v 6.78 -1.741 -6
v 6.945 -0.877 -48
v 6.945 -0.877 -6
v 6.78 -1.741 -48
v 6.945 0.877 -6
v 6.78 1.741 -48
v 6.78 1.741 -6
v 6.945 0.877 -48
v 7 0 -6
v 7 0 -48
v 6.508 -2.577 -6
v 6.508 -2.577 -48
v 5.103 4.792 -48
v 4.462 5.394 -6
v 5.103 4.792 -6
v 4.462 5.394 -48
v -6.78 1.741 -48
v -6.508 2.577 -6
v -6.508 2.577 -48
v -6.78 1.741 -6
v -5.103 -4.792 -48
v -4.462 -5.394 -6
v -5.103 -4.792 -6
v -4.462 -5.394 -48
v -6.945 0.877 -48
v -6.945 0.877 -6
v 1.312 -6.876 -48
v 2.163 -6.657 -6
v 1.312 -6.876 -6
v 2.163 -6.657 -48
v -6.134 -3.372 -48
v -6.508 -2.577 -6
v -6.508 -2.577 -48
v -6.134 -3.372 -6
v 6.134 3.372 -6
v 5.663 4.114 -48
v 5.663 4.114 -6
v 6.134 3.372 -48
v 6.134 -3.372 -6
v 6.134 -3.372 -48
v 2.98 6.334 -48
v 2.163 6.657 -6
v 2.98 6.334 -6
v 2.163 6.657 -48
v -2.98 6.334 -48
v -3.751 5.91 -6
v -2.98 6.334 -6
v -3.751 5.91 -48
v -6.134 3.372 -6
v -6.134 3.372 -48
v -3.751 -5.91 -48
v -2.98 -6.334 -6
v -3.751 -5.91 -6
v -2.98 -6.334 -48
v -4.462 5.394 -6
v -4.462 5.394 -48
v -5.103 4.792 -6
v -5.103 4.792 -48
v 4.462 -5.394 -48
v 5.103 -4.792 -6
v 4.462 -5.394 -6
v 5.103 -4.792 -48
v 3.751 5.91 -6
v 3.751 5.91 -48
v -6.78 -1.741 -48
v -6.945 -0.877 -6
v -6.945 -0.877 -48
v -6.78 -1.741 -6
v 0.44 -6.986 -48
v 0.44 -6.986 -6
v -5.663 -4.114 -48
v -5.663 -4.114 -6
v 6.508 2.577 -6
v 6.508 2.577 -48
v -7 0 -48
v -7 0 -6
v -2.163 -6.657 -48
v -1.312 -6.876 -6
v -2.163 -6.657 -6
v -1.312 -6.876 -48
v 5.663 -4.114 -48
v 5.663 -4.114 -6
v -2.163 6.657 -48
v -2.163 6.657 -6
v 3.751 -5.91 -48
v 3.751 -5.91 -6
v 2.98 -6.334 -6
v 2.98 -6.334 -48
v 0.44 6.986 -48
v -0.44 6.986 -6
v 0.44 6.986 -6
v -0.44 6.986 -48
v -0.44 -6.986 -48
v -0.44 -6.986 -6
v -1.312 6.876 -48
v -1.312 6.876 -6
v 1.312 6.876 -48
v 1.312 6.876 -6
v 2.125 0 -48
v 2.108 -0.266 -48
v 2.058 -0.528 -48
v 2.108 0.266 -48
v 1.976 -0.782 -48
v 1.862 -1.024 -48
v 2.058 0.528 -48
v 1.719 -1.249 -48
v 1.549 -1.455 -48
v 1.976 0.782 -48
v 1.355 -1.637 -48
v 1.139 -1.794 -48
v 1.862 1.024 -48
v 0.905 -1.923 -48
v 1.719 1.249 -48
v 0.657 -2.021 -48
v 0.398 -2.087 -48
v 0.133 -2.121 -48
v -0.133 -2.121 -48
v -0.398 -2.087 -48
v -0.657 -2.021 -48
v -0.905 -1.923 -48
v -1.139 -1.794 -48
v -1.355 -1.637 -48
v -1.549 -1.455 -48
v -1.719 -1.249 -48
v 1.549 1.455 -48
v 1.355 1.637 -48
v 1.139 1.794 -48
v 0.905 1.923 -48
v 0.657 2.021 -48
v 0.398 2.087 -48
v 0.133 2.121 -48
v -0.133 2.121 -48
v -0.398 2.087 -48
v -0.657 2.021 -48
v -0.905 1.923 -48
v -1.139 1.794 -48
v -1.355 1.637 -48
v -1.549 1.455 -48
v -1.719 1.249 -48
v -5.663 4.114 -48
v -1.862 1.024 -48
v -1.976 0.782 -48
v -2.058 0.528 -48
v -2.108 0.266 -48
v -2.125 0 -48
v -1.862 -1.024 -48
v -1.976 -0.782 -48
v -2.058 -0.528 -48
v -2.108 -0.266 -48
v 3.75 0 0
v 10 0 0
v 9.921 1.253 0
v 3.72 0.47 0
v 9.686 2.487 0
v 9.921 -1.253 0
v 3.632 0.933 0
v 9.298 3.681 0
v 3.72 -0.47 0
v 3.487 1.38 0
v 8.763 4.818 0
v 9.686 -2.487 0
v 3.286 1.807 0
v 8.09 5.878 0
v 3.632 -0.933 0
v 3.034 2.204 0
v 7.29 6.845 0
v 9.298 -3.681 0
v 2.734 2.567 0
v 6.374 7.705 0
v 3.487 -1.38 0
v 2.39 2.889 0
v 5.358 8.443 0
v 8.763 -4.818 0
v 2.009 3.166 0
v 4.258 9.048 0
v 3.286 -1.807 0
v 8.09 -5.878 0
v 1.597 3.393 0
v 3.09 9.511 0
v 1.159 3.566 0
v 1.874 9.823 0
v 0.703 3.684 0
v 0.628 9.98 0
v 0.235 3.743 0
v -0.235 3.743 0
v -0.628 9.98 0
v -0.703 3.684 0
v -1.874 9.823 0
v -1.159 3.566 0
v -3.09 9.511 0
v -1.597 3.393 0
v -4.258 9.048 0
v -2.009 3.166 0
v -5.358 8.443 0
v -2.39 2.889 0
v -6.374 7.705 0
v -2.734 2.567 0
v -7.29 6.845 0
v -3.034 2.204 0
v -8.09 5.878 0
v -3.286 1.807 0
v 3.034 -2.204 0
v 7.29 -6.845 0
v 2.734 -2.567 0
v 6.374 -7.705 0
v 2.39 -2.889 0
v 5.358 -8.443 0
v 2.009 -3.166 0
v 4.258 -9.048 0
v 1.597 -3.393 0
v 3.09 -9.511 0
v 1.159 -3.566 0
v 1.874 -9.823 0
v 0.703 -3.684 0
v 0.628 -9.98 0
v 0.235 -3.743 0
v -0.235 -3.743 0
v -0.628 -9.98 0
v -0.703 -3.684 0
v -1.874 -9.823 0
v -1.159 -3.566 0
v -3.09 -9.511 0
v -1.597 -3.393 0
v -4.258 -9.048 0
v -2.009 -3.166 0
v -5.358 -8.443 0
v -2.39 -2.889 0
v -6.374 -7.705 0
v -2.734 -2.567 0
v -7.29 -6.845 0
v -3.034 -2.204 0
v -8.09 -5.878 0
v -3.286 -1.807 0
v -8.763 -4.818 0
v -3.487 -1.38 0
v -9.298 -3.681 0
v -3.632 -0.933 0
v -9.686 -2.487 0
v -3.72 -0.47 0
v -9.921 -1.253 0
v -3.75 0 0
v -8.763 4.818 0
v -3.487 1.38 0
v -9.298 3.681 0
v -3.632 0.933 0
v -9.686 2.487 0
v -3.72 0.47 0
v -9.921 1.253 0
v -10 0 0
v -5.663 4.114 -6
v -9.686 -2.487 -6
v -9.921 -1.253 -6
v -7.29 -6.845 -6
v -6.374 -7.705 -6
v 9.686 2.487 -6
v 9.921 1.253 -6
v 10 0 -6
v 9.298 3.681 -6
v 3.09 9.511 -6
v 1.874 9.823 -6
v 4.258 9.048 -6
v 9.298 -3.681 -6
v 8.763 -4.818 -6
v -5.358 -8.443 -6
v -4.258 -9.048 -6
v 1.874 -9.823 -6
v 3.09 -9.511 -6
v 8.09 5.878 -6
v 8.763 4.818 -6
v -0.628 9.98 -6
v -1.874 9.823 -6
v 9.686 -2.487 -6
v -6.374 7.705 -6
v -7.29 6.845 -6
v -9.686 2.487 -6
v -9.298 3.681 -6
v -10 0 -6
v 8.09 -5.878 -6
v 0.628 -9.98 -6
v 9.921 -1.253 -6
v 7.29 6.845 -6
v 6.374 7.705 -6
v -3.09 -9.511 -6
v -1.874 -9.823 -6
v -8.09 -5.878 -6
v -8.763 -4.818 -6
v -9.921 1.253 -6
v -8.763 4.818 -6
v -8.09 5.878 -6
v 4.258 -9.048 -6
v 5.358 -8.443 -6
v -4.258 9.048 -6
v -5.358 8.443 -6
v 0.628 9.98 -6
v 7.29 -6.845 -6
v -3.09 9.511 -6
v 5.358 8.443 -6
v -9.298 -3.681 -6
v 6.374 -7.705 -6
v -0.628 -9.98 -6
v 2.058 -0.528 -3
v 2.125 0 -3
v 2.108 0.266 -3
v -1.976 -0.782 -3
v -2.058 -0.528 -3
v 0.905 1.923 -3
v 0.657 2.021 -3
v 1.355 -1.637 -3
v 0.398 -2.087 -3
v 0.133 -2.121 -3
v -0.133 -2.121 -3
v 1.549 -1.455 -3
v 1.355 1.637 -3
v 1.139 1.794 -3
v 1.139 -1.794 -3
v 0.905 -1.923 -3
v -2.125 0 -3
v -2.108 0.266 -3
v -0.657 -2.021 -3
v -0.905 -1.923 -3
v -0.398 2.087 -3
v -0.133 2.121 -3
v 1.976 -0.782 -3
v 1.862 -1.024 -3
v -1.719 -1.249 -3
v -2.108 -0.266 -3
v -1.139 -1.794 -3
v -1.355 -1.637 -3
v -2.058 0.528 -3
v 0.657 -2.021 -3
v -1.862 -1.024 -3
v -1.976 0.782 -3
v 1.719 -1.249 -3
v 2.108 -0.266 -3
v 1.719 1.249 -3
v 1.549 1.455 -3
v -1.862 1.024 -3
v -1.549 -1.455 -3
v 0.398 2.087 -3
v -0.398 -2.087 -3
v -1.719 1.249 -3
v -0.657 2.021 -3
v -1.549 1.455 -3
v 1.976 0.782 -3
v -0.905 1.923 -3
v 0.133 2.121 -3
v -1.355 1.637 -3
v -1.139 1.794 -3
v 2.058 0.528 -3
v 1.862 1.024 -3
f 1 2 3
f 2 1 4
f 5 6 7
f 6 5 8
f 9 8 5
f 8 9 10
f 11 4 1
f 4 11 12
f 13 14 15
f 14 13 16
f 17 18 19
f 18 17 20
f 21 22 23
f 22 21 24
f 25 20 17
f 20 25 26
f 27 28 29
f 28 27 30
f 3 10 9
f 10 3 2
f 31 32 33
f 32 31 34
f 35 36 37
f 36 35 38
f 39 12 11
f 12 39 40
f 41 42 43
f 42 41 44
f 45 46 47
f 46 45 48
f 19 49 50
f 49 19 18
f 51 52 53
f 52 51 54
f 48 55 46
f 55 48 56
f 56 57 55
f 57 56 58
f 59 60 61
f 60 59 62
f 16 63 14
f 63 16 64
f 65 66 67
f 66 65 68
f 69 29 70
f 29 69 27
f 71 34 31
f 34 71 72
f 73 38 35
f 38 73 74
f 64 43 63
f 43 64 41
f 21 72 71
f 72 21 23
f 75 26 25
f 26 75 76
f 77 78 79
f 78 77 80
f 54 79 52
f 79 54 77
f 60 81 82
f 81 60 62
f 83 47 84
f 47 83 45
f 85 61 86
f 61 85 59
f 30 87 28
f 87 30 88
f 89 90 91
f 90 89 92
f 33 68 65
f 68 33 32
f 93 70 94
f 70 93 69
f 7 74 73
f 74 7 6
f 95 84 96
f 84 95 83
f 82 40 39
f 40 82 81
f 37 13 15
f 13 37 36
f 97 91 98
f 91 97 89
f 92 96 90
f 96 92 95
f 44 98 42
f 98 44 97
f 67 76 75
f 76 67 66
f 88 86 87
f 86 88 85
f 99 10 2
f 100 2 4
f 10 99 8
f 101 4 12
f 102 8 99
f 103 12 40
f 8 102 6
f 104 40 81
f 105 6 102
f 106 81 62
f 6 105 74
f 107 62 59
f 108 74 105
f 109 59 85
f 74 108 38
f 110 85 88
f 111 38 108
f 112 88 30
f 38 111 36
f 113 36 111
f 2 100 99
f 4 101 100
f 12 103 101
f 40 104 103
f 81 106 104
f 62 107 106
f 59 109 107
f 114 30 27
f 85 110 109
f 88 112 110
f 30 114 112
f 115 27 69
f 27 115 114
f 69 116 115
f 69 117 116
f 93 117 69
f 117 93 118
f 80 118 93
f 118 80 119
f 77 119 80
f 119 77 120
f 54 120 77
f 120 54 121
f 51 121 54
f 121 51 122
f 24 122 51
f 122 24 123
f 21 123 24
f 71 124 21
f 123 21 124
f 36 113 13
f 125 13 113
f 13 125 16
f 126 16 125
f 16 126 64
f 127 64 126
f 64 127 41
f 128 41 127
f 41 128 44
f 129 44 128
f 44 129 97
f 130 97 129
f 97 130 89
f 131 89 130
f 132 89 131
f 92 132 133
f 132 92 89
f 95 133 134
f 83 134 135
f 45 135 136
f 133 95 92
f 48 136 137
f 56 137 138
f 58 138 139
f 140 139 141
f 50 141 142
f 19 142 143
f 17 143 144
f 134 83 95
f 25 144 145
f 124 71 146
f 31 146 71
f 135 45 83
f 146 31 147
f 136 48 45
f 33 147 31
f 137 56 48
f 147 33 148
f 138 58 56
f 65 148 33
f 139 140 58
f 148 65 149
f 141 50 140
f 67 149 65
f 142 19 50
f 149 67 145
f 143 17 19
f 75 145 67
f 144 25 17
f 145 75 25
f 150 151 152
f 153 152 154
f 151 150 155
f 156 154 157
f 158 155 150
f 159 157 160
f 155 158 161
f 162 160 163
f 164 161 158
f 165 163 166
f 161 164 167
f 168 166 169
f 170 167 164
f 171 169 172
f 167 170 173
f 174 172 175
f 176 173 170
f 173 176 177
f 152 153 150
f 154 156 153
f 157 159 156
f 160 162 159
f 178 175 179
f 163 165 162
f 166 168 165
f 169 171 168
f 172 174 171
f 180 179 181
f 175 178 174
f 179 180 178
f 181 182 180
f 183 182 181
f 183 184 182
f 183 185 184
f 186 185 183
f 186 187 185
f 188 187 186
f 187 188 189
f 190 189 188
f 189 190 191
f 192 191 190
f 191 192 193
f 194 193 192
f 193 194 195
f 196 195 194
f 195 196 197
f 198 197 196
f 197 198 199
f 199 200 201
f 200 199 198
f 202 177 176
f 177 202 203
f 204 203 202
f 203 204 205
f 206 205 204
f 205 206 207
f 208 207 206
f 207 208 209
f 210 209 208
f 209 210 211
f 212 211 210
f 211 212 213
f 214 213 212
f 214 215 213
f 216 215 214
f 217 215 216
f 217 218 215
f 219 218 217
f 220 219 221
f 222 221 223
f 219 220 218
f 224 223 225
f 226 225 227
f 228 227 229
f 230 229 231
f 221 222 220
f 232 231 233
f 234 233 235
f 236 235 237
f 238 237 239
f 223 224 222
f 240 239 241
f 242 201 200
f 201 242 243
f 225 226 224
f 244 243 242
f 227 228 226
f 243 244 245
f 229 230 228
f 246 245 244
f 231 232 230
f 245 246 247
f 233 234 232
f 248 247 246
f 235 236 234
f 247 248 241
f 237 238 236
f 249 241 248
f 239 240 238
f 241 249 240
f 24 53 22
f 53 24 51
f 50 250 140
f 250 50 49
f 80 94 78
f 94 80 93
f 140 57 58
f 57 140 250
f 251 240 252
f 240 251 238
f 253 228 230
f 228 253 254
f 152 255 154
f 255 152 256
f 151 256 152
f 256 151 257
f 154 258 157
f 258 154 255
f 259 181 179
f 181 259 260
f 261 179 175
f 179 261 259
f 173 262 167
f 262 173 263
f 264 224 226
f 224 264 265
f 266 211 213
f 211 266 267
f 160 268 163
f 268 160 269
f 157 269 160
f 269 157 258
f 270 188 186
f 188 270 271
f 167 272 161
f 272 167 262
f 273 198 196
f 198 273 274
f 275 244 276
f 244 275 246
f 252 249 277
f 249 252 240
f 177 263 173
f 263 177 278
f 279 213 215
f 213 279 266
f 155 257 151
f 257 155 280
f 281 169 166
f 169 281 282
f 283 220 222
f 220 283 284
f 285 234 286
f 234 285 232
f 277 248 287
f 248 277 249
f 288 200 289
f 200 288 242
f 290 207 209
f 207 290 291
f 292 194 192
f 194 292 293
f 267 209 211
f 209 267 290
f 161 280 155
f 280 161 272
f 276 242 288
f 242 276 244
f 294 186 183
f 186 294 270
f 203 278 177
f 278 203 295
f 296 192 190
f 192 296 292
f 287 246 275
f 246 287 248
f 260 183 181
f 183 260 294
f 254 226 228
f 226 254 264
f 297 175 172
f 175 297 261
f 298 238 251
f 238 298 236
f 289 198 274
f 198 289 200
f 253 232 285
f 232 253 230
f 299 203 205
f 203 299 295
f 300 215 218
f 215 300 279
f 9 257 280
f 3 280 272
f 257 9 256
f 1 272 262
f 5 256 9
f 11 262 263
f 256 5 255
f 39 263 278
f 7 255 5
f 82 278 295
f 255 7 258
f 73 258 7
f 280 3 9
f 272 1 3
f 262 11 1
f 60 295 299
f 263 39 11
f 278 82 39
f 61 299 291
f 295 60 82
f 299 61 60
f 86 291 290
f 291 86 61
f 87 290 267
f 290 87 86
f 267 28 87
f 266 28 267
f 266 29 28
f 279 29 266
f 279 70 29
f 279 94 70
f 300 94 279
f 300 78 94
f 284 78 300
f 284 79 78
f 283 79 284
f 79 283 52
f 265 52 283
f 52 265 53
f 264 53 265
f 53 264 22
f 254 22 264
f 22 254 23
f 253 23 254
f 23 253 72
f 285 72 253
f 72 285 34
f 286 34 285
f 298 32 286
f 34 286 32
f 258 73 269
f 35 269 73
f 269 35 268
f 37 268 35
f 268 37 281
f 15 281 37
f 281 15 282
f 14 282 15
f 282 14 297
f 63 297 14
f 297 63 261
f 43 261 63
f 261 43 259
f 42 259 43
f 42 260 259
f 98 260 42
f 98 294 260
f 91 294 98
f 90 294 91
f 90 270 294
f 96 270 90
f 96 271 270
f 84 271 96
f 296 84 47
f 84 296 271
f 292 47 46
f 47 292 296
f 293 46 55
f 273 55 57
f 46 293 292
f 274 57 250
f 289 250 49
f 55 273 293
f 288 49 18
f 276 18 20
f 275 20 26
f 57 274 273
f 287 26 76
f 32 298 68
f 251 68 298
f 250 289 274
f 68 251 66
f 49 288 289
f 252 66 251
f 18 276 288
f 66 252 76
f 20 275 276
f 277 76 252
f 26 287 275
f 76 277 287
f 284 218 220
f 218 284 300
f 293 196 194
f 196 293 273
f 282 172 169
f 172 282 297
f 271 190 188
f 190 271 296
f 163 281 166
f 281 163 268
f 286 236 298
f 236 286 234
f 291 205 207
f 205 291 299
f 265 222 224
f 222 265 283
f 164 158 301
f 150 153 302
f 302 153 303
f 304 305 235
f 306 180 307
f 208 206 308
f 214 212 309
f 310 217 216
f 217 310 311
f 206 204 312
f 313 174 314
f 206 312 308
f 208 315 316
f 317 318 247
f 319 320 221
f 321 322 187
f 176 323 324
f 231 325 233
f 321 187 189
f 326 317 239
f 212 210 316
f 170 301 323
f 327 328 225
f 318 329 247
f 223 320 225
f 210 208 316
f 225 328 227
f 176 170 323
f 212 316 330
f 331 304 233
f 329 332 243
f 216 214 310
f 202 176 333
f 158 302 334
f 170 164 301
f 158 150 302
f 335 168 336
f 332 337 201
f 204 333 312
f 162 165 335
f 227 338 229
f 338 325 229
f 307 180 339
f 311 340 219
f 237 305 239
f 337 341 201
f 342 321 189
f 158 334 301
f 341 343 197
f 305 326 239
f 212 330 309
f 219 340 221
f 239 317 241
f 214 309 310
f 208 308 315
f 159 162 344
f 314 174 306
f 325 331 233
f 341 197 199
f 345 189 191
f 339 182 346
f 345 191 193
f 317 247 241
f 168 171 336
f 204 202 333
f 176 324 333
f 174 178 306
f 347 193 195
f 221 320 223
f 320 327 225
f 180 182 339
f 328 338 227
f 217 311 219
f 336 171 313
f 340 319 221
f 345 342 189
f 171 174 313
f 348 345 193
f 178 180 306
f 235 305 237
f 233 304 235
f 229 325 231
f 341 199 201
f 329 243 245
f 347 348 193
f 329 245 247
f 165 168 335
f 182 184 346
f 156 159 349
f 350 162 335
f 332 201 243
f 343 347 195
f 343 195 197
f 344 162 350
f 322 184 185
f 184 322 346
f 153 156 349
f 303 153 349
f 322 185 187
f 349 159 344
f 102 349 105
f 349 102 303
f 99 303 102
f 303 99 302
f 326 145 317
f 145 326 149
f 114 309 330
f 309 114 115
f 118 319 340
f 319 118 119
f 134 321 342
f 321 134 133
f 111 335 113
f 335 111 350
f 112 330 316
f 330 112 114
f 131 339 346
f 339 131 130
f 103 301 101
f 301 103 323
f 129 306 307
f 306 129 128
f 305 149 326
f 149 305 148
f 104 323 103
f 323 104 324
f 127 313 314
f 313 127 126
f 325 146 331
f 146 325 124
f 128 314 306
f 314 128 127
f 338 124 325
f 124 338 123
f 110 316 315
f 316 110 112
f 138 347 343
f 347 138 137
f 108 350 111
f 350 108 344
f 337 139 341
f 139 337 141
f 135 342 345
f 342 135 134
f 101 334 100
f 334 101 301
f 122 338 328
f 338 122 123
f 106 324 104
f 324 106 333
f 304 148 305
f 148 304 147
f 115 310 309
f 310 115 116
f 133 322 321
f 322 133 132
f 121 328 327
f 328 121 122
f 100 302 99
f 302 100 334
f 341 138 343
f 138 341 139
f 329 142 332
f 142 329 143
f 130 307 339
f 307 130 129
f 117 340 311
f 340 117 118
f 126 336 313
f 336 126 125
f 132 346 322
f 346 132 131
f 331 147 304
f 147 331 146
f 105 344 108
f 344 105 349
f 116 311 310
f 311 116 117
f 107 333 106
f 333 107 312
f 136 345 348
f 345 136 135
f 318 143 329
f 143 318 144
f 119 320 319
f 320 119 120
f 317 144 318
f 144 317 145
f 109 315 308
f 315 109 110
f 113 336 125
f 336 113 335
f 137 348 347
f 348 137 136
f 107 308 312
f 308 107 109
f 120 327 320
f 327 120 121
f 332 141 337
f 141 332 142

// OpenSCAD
$fn = 50;


difference() {
	union() {
		translate(v = [0, 0, -48.0000000000]) {
			cylinder(h = 48, r = 7.0000000000);
		}
		translate(v = [0, 0, -6.0000000000]) {
			cylinder(h = 6, r = 10.0000000000);
		}
	}
	union() {
		translate(v = [0, 0, 0]) {
			rotate(a = [0, 0, 0]) {
				difference() {
					union() {
						#translate(v = [0, 0, -48.0000000000]) {
							cylinder(h = 48, r = 2.0000000000);
						}
						#translate(v = [0, 0, -3]) {
							cylinder(h = 3, r1 = 2.1250000000, r2 = 3.7500000000);
						}
						#translate(v = [0, 0, -48.0000000000]) {
							cylinder(h = 48, r = 2.1250000000);
						}
						#translate(v = [0, 0, -48.0000000000]) {
							cylinder(h = 48, r = 2.0000000000);
						}
					}
					union();
				}
			}
		}
	}
}
